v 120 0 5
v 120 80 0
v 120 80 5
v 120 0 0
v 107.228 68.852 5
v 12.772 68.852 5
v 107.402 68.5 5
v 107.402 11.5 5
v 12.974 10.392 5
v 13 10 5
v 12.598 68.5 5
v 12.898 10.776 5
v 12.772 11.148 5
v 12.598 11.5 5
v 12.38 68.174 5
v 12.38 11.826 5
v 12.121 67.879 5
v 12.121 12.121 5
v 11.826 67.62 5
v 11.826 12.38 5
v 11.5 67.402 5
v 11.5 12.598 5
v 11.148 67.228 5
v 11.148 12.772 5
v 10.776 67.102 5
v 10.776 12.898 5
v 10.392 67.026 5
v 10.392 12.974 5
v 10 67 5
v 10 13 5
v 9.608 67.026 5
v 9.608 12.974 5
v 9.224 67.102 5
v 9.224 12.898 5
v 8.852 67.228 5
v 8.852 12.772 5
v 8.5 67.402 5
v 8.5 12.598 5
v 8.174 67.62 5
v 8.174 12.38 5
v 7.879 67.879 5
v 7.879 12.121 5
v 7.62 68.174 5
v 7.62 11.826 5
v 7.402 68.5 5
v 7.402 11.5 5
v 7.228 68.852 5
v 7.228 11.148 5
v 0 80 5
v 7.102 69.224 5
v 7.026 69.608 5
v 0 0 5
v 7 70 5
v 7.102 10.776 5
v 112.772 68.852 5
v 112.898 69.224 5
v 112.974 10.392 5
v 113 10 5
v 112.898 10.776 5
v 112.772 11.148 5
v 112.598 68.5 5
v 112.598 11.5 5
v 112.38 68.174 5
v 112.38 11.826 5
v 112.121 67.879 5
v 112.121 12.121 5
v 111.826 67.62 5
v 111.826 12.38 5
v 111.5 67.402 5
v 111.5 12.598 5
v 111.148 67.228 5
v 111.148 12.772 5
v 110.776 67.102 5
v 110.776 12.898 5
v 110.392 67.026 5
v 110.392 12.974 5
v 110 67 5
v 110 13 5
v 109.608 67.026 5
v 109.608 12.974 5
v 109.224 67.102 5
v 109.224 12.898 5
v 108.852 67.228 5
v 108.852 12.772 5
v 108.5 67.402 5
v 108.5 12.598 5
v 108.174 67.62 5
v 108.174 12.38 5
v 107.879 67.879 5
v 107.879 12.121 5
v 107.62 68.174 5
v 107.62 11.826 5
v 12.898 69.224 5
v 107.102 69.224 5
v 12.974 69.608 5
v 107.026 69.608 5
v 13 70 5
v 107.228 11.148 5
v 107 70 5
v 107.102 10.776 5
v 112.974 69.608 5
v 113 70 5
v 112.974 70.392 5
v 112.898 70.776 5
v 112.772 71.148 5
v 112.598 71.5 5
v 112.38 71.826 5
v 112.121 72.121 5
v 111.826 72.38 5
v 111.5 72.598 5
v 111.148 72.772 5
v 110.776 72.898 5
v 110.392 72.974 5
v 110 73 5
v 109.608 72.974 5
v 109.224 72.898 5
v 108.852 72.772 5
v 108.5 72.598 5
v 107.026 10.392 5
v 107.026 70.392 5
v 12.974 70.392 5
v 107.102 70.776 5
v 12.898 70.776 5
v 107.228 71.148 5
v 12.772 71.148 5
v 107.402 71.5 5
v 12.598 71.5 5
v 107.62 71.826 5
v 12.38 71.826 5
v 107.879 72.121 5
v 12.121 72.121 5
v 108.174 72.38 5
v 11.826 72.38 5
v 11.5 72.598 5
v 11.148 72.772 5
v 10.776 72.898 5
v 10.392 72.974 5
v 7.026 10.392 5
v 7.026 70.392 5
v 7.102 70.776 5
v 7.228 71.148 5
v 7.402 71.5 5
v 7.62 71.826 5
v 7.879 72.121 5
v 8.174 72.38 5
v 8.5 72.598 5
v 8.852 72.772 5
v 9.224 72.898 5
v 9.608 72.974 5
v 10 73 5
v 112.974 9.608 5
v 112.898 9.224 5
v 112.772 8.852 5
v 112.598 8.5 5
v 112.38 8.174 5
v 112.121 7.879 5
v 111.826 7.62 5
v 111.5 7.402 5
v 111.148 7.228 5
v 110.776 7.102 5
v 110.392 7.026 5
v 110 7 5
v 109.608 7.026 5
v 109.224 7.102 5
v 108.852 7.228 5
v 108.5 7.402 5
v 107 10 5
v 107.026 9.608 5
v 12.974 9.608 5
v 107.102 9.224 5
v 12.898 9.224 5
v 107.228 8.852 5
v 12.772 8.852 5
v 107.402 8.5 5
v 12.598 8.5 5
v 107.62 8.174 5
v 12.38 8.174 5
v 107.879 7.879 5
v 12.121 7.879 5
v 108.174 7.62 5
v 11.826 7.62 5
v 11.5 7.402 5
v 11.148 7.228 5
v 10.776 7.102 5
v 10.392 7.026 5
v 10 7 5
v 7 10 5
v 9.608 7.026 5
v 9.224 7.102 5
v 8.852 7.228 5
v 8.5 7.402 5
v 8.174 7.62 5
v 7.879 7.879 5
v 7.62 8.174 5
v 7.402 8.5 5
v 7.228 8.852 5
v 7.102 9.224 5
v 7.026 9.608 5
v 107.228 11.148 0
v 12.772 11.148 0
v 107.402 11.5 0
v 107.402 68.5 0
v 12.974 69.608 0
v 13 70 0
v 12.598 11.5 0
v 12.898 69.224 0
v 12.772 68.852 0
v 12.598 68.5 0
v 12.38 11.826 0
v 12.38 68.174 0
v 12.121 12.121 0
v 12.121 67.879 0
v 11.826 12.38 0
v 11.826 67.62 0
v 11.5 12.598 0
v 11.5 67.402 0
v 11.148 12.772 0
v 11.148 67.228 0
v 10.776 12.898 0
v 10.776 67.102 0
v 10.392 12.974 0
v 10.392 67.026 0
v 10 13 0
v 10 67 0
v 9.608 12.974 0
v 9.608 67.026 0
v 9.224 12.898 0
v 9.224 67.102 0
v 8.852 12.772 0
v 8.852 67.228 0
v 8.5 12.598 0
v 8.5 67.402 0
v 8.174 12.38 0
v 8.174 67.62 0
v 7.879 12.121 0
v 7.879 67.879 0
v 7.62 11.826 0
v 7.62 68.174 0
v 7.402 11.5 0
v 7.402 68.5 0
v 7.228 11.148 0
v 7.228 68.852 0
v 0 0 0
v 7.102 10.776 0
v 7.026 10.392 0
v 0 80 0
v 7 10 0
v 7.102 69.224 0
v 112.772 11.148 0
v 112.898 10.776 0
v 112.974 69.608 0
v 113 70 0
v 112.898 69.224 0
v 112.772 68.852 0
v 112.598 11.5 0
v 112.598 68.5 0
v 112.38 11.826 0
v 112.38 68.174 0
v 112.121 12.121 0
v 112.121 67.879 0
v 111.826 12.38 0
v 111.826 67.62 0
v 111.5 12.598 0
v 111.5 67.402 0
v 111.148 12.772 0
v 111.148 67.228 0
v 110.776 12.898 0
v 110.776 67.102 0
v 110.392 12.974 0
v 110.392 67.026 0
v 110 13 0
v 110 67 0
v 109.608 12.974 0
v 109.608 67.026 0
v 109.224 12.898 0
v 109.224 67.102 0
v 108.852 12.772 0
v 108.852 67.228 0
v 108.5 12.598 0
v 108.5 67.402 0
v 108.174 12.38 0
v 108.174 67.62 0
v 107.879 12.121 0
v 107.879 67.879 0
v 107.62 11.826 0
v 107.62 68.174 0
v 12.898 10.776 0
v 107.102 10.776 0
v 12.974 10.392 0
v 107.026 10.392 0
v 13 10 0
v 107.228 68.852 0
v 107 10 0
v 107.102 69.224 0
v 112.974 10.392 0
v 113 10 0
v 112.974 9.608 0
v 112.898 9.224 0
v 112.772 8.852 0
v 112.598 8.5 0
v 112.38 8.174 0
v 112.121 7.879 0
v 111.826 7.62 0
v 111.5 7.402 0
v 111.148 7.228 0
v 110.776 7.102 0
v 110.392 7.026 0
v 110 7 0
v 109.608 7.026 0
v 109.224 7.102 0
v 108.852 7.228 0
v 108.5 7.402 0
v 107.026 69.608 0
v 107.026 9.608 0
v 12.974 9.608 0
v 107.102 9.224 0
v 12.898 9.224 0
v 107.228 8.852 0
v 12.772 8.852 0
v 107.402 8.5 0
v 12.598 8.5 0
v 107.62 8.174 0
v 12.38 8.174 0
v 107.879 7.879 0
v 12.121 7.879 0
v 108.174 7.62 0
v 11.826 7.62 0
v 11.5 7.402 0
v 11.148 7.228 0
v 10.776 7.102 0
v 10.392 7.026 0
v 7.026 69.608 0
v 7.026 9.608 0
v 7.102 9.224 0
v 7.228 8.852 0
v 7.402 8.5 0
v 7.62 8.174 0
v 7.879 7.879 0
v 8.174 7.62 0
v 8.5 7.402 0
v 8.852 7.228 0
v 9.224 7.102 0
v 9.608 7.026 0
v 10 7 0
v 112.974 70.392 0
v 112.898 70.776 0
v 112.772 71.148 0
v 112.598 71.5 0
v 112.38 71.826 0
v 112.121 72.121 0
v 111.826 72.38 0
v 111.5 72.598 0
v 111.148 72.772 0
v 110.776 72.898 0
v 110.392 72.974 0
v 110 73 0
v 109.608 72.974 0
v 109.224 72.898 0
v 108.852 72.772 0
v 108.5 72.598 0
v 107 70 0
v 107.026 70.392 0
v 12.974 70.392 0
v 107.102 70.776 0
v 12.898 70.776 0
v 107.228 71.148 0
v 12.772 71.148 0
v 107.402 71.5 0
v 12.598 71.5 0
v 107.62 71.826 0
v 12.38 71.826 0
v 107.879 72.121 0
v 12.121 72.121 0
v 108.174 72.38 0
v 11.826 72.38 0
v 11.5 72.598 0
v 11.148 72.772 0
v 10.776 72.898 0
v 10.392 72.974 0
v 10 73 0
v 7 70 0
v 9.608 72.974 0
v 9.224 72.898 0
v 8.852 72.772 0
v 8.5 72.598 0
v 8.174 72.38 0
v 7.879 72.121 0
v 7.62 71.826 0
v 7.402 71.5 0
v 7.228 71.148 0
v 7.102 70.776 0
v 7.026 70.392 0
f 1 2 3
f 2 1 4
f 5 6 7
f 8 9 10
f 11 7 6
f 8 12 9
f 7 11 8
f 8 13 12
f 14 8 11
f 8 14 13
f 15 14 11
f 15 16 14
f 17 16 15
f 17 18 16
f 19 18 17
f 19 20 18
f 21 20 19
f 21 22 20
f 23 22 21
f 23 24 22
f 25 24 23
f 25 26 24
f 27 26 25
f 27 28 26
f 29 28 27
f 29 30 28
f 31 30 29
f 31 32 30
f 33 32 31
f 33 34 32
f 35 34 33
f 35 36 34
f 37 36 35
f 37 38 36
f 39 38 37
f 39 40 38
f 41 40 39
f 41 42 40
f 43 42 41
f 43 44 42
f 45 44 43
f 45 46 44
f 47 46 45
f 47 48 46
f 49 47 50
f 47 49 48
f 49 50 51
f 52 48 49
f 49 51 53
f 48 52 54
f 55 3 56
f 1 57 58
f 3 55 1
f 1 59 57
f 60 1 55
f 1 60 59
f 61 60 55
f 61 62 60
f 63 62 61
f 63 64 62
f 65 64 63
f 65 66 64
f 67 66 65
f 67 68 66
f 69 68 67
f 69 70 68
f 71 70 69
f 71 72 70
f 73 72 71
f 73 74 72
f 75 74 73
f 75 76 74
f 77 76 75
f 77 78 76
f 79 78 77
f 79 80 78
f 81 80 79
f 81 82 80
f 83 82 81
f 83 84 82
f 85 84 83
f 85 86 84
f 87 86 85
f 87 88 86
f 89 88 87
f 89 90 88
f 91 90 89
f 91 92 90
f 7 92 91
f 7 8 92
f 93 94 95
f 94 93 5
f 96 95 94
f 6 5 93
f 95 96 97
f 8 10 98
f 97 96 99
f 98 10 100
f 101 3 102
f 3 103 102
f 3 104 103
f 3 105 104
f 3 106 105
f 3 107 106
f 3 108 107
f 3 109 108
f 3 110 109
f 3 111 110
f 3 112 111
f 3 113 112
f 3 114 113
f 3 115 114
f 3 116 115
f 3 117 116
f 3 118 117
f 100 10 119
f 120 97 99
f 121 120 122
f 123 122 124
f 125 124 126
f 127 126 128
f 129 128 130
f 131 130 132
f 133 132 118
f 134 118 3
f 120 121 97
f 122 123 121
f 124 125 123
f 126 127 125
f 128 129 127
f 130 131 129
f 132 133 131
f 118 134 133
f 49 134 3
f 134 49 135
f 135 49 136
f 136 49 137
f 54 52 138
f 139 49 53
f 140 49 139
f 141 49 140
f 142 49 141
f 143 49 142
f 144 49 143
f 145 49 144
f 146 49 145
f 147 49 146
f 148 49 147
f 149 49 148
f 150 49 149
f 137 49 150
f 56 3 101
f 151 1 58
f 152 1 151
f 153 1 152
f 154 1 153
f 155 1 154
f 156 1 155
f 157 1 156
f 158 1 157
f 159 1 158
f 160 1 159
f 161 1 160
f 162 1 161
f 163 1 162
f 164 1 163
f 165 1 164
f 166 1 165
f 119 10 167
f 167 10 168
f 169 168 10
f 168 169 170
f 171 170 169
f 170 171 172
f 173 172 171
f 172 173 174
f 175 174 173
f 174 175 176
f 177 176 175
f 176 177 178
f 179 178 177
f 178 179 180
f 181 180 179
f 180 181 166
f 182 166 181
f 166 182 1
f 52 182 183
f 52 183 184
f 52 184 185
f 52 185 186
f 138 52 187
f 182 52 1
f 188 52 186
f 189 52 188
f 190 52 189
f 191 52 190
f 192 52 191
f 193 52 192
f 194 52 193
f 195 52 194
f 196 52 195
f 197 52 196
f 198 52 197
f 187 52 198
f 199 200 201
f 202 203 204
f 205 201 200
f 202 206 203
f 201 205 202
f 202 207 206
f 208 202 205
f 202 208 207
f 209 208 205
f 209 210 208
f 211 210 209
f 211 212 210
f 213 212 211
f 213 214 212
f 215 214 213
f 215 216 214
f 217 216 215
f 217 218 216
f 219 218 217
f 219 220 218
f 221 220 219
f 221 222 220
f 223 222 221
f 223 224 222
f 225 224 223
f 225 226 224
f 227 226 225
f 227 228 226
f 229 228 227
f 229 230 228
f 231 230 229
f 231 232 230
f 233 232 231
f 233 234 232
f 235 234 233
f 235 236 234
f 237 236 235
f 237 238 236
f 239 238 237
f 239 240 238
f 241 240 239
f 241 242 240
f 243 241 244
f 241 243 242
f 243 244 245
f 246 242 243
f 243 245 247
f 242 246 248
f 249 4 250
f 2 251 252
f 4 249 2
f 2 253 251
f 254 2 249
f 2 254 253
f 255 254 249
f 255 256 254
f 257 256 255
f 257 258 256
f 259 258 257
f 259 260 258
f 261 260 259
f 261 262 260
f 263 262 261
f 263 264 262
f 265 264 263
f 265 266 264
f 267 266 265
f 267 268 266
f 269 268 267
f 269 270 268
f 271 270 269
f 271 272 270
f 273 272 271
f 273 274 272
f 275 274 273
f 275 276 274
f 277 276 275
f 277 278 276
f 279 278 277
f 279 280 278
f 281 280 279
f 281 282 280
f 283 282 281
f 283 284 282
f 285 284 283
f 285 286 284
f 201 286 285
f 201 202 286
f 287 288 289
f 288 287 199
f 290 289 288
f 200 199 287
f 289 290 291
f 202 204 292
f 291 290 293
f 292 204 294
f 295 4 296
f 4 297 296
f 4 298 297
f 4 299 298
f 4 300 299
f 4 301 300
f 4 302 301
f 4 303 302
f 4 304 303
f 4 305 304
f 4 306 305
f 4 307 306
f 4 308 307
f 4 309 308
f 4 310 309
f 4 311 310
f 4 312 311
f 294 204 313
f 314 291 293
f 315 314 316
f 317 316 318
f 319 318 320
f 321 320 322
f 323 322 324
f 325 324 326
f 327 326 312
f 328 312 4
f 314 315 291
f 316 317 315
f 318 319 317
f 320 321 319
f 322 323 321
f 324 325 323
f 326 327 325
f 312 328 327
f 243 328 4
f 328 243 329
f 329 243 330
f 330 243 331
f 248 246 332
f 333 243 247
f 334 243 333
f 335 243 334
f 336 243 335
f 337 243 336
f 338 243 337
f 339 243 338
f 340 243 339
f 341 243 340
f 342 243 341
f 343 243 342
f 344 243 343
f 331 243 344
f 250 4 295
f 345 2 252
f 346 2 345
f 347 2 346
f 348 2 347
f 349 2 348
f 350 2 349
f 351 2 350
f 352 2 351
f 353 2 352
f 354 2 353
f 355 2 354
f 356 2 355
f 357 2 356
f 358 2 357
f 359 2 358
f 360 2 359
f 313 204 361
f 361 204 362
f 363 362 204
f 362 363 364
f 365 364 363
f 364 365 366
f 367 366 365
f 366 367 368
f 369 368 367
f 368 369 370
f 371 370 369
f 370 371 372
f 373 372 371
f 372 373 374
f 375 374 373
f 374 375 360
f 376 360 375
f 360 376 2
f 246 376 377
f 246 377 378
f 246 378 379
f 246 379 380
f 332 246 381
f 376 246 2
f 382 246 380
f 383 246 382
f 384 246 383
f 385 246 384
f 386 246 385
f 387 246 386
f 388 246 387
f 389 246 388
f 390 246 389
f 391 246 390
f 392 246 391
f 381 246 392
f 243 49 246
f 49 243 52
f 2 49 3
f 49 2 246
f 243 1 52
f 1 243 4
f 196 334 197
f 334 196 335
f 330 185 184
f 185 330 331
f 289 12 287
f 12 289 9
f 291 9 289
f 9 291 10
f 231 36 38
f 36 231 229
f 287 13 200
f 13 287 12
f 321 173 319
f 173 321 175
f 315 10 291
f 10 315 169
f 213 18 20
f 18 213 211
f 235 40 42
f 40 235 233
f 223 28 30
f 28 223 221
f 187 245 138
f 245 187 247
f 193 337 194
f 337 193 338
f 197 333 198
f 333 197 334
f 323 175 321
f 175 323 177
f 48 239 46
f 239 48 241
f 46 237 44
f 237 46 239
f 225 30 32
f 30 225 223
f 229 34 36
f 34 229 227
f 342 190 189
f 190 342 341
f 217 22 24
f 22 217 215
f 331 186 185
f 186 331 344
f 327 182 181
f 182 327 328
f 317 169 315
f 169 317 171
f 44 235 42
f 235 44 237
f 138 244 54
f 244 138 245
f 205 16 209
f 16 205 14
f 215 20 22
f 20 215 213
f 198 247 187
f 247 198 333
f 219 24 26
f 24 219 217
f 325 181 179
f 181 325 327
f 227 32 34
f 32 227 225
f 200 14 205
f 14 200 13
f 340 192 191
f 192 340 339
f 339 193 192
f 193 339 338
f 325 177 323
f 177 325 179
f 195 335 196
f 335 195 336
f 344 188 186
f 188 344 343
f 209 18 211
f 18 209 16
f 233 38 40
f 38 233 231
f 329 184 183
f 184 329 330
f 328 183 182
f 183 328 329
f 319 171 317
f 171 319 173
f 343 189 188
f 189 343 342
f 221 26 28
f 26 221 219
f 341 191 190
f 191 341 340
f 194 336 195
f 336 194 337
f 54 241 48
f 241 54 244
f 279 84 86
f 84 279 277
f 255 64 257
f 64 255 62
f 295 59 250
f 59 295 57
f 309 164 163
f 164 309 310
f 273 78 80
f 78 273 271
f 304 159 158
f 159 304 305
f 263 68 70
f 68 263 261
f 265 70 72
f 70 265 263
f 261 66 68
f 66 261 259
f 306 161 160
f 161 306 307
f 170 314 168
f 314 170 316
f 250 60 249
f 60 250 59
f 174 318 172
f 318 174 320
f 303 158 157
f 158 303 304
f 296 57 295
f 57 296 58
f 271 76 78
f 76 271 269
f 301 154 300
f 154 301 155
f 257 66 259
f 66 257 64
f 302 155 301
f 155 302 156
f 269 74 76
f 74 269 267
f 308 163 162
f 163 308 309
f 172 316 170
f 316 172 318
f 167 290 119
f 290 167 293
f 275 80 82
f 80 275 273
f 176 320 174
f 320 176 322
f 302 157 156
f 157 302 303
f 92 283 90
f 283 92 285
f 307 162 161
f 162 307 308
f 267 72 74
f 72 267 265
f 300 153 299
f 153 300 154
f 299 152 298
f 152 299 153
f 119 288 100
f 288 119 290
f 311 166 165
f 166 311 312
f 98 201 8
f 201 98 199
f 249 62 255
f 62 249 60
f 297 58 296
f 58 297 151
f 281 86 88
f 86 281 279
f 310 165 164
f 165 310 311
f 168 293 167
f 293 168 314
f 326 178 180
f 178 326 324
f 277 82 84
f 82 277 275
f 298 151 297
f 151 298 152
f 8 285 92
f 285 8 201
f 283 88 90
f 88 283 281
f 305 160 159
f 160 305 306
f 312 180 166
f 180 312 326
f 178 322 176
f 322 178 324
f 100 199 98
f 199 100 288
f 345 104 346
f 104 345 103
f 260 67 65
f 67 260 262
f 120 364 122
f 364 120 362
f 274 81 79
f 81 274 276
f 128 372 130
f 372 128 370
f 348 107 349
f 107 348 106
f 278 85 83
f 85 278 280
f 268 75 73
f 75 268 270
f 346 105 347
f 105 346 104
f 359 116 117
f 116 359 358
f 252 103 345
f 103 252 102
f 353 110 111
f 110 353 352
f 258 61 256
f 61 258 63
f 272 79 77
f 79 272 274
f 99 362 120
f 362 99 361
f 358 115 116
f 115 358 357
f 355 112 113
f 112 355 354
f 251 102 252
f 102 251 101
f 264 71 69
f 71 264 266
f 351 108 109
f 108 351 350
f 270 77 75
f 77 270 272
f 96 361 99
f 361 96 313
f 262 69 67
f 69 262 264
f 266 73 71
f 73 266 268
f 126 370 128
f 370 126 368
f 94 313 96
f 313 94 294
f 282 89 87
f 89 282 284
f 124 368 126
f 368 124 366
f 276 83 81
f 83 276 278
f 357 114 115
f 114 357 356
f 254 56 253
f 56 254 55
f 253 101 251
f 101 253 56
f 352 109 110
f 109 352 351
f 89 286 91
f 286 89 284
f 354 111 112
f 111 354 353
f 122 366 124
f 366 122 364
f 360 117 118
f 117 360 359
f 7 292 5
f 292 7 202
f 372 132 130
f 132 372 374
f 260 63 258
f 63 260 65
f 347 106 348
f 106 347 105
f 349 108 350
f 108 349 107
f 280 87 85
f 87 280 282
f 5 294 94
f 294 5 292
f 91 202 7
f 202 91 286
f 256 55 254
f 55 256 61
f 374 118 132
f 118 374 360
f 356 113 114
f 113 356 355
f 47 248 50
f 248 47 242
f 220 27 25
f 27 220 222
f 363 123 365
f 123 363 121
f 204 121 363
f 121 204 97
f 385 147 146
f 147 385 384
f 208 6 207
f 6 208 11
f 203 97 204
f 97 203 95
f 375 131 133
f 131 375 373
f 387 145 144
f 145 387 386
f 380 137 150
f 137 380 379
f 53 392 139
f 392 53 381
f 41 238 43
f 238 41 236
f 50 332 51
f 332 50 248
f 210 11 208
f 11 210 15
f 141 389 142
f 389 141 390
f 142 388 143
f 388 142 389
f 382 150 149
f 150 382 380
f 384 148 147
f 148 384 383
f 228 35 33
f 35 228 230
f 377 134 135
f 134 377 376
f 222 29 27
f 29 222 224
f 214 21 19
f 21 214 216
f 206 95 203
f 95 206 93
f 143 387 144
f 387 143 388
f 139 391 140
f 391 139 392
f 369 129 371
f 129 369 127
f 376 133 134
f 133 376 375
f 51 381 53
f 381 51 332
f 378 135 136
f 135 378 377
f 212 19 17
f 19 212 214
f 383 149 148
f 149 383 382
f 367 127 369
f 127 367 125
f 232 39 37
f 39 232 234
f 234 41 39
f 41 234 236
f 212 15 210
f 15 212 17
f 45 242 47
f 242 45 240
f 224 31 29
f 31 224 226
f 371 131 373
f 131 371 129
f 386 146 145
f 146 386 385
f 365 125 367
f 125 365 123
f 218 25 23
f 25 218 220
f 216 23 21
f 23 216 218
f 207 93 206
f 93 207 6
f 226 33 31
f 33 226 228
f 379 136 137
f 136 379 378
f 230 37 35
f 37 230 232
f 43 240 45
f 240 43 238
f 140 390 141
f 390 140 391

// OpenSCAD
// T2424-0037 controlled NLP-to-CAD
difference() {
    cube([120, 80, 5], center=false);
    translate([10, 10, -1]) cylinder(h=7, r=3, $fn=48);
    translate([110, 10, -1]) cylinder(h=7, r=3, $fn=48);
    translate([110, 70, -1]) cylinder(h=7, r=3, $fn=48);
    translate([10, 70, -1]) cylinder(h=7, r=3, $fn=48);
}
